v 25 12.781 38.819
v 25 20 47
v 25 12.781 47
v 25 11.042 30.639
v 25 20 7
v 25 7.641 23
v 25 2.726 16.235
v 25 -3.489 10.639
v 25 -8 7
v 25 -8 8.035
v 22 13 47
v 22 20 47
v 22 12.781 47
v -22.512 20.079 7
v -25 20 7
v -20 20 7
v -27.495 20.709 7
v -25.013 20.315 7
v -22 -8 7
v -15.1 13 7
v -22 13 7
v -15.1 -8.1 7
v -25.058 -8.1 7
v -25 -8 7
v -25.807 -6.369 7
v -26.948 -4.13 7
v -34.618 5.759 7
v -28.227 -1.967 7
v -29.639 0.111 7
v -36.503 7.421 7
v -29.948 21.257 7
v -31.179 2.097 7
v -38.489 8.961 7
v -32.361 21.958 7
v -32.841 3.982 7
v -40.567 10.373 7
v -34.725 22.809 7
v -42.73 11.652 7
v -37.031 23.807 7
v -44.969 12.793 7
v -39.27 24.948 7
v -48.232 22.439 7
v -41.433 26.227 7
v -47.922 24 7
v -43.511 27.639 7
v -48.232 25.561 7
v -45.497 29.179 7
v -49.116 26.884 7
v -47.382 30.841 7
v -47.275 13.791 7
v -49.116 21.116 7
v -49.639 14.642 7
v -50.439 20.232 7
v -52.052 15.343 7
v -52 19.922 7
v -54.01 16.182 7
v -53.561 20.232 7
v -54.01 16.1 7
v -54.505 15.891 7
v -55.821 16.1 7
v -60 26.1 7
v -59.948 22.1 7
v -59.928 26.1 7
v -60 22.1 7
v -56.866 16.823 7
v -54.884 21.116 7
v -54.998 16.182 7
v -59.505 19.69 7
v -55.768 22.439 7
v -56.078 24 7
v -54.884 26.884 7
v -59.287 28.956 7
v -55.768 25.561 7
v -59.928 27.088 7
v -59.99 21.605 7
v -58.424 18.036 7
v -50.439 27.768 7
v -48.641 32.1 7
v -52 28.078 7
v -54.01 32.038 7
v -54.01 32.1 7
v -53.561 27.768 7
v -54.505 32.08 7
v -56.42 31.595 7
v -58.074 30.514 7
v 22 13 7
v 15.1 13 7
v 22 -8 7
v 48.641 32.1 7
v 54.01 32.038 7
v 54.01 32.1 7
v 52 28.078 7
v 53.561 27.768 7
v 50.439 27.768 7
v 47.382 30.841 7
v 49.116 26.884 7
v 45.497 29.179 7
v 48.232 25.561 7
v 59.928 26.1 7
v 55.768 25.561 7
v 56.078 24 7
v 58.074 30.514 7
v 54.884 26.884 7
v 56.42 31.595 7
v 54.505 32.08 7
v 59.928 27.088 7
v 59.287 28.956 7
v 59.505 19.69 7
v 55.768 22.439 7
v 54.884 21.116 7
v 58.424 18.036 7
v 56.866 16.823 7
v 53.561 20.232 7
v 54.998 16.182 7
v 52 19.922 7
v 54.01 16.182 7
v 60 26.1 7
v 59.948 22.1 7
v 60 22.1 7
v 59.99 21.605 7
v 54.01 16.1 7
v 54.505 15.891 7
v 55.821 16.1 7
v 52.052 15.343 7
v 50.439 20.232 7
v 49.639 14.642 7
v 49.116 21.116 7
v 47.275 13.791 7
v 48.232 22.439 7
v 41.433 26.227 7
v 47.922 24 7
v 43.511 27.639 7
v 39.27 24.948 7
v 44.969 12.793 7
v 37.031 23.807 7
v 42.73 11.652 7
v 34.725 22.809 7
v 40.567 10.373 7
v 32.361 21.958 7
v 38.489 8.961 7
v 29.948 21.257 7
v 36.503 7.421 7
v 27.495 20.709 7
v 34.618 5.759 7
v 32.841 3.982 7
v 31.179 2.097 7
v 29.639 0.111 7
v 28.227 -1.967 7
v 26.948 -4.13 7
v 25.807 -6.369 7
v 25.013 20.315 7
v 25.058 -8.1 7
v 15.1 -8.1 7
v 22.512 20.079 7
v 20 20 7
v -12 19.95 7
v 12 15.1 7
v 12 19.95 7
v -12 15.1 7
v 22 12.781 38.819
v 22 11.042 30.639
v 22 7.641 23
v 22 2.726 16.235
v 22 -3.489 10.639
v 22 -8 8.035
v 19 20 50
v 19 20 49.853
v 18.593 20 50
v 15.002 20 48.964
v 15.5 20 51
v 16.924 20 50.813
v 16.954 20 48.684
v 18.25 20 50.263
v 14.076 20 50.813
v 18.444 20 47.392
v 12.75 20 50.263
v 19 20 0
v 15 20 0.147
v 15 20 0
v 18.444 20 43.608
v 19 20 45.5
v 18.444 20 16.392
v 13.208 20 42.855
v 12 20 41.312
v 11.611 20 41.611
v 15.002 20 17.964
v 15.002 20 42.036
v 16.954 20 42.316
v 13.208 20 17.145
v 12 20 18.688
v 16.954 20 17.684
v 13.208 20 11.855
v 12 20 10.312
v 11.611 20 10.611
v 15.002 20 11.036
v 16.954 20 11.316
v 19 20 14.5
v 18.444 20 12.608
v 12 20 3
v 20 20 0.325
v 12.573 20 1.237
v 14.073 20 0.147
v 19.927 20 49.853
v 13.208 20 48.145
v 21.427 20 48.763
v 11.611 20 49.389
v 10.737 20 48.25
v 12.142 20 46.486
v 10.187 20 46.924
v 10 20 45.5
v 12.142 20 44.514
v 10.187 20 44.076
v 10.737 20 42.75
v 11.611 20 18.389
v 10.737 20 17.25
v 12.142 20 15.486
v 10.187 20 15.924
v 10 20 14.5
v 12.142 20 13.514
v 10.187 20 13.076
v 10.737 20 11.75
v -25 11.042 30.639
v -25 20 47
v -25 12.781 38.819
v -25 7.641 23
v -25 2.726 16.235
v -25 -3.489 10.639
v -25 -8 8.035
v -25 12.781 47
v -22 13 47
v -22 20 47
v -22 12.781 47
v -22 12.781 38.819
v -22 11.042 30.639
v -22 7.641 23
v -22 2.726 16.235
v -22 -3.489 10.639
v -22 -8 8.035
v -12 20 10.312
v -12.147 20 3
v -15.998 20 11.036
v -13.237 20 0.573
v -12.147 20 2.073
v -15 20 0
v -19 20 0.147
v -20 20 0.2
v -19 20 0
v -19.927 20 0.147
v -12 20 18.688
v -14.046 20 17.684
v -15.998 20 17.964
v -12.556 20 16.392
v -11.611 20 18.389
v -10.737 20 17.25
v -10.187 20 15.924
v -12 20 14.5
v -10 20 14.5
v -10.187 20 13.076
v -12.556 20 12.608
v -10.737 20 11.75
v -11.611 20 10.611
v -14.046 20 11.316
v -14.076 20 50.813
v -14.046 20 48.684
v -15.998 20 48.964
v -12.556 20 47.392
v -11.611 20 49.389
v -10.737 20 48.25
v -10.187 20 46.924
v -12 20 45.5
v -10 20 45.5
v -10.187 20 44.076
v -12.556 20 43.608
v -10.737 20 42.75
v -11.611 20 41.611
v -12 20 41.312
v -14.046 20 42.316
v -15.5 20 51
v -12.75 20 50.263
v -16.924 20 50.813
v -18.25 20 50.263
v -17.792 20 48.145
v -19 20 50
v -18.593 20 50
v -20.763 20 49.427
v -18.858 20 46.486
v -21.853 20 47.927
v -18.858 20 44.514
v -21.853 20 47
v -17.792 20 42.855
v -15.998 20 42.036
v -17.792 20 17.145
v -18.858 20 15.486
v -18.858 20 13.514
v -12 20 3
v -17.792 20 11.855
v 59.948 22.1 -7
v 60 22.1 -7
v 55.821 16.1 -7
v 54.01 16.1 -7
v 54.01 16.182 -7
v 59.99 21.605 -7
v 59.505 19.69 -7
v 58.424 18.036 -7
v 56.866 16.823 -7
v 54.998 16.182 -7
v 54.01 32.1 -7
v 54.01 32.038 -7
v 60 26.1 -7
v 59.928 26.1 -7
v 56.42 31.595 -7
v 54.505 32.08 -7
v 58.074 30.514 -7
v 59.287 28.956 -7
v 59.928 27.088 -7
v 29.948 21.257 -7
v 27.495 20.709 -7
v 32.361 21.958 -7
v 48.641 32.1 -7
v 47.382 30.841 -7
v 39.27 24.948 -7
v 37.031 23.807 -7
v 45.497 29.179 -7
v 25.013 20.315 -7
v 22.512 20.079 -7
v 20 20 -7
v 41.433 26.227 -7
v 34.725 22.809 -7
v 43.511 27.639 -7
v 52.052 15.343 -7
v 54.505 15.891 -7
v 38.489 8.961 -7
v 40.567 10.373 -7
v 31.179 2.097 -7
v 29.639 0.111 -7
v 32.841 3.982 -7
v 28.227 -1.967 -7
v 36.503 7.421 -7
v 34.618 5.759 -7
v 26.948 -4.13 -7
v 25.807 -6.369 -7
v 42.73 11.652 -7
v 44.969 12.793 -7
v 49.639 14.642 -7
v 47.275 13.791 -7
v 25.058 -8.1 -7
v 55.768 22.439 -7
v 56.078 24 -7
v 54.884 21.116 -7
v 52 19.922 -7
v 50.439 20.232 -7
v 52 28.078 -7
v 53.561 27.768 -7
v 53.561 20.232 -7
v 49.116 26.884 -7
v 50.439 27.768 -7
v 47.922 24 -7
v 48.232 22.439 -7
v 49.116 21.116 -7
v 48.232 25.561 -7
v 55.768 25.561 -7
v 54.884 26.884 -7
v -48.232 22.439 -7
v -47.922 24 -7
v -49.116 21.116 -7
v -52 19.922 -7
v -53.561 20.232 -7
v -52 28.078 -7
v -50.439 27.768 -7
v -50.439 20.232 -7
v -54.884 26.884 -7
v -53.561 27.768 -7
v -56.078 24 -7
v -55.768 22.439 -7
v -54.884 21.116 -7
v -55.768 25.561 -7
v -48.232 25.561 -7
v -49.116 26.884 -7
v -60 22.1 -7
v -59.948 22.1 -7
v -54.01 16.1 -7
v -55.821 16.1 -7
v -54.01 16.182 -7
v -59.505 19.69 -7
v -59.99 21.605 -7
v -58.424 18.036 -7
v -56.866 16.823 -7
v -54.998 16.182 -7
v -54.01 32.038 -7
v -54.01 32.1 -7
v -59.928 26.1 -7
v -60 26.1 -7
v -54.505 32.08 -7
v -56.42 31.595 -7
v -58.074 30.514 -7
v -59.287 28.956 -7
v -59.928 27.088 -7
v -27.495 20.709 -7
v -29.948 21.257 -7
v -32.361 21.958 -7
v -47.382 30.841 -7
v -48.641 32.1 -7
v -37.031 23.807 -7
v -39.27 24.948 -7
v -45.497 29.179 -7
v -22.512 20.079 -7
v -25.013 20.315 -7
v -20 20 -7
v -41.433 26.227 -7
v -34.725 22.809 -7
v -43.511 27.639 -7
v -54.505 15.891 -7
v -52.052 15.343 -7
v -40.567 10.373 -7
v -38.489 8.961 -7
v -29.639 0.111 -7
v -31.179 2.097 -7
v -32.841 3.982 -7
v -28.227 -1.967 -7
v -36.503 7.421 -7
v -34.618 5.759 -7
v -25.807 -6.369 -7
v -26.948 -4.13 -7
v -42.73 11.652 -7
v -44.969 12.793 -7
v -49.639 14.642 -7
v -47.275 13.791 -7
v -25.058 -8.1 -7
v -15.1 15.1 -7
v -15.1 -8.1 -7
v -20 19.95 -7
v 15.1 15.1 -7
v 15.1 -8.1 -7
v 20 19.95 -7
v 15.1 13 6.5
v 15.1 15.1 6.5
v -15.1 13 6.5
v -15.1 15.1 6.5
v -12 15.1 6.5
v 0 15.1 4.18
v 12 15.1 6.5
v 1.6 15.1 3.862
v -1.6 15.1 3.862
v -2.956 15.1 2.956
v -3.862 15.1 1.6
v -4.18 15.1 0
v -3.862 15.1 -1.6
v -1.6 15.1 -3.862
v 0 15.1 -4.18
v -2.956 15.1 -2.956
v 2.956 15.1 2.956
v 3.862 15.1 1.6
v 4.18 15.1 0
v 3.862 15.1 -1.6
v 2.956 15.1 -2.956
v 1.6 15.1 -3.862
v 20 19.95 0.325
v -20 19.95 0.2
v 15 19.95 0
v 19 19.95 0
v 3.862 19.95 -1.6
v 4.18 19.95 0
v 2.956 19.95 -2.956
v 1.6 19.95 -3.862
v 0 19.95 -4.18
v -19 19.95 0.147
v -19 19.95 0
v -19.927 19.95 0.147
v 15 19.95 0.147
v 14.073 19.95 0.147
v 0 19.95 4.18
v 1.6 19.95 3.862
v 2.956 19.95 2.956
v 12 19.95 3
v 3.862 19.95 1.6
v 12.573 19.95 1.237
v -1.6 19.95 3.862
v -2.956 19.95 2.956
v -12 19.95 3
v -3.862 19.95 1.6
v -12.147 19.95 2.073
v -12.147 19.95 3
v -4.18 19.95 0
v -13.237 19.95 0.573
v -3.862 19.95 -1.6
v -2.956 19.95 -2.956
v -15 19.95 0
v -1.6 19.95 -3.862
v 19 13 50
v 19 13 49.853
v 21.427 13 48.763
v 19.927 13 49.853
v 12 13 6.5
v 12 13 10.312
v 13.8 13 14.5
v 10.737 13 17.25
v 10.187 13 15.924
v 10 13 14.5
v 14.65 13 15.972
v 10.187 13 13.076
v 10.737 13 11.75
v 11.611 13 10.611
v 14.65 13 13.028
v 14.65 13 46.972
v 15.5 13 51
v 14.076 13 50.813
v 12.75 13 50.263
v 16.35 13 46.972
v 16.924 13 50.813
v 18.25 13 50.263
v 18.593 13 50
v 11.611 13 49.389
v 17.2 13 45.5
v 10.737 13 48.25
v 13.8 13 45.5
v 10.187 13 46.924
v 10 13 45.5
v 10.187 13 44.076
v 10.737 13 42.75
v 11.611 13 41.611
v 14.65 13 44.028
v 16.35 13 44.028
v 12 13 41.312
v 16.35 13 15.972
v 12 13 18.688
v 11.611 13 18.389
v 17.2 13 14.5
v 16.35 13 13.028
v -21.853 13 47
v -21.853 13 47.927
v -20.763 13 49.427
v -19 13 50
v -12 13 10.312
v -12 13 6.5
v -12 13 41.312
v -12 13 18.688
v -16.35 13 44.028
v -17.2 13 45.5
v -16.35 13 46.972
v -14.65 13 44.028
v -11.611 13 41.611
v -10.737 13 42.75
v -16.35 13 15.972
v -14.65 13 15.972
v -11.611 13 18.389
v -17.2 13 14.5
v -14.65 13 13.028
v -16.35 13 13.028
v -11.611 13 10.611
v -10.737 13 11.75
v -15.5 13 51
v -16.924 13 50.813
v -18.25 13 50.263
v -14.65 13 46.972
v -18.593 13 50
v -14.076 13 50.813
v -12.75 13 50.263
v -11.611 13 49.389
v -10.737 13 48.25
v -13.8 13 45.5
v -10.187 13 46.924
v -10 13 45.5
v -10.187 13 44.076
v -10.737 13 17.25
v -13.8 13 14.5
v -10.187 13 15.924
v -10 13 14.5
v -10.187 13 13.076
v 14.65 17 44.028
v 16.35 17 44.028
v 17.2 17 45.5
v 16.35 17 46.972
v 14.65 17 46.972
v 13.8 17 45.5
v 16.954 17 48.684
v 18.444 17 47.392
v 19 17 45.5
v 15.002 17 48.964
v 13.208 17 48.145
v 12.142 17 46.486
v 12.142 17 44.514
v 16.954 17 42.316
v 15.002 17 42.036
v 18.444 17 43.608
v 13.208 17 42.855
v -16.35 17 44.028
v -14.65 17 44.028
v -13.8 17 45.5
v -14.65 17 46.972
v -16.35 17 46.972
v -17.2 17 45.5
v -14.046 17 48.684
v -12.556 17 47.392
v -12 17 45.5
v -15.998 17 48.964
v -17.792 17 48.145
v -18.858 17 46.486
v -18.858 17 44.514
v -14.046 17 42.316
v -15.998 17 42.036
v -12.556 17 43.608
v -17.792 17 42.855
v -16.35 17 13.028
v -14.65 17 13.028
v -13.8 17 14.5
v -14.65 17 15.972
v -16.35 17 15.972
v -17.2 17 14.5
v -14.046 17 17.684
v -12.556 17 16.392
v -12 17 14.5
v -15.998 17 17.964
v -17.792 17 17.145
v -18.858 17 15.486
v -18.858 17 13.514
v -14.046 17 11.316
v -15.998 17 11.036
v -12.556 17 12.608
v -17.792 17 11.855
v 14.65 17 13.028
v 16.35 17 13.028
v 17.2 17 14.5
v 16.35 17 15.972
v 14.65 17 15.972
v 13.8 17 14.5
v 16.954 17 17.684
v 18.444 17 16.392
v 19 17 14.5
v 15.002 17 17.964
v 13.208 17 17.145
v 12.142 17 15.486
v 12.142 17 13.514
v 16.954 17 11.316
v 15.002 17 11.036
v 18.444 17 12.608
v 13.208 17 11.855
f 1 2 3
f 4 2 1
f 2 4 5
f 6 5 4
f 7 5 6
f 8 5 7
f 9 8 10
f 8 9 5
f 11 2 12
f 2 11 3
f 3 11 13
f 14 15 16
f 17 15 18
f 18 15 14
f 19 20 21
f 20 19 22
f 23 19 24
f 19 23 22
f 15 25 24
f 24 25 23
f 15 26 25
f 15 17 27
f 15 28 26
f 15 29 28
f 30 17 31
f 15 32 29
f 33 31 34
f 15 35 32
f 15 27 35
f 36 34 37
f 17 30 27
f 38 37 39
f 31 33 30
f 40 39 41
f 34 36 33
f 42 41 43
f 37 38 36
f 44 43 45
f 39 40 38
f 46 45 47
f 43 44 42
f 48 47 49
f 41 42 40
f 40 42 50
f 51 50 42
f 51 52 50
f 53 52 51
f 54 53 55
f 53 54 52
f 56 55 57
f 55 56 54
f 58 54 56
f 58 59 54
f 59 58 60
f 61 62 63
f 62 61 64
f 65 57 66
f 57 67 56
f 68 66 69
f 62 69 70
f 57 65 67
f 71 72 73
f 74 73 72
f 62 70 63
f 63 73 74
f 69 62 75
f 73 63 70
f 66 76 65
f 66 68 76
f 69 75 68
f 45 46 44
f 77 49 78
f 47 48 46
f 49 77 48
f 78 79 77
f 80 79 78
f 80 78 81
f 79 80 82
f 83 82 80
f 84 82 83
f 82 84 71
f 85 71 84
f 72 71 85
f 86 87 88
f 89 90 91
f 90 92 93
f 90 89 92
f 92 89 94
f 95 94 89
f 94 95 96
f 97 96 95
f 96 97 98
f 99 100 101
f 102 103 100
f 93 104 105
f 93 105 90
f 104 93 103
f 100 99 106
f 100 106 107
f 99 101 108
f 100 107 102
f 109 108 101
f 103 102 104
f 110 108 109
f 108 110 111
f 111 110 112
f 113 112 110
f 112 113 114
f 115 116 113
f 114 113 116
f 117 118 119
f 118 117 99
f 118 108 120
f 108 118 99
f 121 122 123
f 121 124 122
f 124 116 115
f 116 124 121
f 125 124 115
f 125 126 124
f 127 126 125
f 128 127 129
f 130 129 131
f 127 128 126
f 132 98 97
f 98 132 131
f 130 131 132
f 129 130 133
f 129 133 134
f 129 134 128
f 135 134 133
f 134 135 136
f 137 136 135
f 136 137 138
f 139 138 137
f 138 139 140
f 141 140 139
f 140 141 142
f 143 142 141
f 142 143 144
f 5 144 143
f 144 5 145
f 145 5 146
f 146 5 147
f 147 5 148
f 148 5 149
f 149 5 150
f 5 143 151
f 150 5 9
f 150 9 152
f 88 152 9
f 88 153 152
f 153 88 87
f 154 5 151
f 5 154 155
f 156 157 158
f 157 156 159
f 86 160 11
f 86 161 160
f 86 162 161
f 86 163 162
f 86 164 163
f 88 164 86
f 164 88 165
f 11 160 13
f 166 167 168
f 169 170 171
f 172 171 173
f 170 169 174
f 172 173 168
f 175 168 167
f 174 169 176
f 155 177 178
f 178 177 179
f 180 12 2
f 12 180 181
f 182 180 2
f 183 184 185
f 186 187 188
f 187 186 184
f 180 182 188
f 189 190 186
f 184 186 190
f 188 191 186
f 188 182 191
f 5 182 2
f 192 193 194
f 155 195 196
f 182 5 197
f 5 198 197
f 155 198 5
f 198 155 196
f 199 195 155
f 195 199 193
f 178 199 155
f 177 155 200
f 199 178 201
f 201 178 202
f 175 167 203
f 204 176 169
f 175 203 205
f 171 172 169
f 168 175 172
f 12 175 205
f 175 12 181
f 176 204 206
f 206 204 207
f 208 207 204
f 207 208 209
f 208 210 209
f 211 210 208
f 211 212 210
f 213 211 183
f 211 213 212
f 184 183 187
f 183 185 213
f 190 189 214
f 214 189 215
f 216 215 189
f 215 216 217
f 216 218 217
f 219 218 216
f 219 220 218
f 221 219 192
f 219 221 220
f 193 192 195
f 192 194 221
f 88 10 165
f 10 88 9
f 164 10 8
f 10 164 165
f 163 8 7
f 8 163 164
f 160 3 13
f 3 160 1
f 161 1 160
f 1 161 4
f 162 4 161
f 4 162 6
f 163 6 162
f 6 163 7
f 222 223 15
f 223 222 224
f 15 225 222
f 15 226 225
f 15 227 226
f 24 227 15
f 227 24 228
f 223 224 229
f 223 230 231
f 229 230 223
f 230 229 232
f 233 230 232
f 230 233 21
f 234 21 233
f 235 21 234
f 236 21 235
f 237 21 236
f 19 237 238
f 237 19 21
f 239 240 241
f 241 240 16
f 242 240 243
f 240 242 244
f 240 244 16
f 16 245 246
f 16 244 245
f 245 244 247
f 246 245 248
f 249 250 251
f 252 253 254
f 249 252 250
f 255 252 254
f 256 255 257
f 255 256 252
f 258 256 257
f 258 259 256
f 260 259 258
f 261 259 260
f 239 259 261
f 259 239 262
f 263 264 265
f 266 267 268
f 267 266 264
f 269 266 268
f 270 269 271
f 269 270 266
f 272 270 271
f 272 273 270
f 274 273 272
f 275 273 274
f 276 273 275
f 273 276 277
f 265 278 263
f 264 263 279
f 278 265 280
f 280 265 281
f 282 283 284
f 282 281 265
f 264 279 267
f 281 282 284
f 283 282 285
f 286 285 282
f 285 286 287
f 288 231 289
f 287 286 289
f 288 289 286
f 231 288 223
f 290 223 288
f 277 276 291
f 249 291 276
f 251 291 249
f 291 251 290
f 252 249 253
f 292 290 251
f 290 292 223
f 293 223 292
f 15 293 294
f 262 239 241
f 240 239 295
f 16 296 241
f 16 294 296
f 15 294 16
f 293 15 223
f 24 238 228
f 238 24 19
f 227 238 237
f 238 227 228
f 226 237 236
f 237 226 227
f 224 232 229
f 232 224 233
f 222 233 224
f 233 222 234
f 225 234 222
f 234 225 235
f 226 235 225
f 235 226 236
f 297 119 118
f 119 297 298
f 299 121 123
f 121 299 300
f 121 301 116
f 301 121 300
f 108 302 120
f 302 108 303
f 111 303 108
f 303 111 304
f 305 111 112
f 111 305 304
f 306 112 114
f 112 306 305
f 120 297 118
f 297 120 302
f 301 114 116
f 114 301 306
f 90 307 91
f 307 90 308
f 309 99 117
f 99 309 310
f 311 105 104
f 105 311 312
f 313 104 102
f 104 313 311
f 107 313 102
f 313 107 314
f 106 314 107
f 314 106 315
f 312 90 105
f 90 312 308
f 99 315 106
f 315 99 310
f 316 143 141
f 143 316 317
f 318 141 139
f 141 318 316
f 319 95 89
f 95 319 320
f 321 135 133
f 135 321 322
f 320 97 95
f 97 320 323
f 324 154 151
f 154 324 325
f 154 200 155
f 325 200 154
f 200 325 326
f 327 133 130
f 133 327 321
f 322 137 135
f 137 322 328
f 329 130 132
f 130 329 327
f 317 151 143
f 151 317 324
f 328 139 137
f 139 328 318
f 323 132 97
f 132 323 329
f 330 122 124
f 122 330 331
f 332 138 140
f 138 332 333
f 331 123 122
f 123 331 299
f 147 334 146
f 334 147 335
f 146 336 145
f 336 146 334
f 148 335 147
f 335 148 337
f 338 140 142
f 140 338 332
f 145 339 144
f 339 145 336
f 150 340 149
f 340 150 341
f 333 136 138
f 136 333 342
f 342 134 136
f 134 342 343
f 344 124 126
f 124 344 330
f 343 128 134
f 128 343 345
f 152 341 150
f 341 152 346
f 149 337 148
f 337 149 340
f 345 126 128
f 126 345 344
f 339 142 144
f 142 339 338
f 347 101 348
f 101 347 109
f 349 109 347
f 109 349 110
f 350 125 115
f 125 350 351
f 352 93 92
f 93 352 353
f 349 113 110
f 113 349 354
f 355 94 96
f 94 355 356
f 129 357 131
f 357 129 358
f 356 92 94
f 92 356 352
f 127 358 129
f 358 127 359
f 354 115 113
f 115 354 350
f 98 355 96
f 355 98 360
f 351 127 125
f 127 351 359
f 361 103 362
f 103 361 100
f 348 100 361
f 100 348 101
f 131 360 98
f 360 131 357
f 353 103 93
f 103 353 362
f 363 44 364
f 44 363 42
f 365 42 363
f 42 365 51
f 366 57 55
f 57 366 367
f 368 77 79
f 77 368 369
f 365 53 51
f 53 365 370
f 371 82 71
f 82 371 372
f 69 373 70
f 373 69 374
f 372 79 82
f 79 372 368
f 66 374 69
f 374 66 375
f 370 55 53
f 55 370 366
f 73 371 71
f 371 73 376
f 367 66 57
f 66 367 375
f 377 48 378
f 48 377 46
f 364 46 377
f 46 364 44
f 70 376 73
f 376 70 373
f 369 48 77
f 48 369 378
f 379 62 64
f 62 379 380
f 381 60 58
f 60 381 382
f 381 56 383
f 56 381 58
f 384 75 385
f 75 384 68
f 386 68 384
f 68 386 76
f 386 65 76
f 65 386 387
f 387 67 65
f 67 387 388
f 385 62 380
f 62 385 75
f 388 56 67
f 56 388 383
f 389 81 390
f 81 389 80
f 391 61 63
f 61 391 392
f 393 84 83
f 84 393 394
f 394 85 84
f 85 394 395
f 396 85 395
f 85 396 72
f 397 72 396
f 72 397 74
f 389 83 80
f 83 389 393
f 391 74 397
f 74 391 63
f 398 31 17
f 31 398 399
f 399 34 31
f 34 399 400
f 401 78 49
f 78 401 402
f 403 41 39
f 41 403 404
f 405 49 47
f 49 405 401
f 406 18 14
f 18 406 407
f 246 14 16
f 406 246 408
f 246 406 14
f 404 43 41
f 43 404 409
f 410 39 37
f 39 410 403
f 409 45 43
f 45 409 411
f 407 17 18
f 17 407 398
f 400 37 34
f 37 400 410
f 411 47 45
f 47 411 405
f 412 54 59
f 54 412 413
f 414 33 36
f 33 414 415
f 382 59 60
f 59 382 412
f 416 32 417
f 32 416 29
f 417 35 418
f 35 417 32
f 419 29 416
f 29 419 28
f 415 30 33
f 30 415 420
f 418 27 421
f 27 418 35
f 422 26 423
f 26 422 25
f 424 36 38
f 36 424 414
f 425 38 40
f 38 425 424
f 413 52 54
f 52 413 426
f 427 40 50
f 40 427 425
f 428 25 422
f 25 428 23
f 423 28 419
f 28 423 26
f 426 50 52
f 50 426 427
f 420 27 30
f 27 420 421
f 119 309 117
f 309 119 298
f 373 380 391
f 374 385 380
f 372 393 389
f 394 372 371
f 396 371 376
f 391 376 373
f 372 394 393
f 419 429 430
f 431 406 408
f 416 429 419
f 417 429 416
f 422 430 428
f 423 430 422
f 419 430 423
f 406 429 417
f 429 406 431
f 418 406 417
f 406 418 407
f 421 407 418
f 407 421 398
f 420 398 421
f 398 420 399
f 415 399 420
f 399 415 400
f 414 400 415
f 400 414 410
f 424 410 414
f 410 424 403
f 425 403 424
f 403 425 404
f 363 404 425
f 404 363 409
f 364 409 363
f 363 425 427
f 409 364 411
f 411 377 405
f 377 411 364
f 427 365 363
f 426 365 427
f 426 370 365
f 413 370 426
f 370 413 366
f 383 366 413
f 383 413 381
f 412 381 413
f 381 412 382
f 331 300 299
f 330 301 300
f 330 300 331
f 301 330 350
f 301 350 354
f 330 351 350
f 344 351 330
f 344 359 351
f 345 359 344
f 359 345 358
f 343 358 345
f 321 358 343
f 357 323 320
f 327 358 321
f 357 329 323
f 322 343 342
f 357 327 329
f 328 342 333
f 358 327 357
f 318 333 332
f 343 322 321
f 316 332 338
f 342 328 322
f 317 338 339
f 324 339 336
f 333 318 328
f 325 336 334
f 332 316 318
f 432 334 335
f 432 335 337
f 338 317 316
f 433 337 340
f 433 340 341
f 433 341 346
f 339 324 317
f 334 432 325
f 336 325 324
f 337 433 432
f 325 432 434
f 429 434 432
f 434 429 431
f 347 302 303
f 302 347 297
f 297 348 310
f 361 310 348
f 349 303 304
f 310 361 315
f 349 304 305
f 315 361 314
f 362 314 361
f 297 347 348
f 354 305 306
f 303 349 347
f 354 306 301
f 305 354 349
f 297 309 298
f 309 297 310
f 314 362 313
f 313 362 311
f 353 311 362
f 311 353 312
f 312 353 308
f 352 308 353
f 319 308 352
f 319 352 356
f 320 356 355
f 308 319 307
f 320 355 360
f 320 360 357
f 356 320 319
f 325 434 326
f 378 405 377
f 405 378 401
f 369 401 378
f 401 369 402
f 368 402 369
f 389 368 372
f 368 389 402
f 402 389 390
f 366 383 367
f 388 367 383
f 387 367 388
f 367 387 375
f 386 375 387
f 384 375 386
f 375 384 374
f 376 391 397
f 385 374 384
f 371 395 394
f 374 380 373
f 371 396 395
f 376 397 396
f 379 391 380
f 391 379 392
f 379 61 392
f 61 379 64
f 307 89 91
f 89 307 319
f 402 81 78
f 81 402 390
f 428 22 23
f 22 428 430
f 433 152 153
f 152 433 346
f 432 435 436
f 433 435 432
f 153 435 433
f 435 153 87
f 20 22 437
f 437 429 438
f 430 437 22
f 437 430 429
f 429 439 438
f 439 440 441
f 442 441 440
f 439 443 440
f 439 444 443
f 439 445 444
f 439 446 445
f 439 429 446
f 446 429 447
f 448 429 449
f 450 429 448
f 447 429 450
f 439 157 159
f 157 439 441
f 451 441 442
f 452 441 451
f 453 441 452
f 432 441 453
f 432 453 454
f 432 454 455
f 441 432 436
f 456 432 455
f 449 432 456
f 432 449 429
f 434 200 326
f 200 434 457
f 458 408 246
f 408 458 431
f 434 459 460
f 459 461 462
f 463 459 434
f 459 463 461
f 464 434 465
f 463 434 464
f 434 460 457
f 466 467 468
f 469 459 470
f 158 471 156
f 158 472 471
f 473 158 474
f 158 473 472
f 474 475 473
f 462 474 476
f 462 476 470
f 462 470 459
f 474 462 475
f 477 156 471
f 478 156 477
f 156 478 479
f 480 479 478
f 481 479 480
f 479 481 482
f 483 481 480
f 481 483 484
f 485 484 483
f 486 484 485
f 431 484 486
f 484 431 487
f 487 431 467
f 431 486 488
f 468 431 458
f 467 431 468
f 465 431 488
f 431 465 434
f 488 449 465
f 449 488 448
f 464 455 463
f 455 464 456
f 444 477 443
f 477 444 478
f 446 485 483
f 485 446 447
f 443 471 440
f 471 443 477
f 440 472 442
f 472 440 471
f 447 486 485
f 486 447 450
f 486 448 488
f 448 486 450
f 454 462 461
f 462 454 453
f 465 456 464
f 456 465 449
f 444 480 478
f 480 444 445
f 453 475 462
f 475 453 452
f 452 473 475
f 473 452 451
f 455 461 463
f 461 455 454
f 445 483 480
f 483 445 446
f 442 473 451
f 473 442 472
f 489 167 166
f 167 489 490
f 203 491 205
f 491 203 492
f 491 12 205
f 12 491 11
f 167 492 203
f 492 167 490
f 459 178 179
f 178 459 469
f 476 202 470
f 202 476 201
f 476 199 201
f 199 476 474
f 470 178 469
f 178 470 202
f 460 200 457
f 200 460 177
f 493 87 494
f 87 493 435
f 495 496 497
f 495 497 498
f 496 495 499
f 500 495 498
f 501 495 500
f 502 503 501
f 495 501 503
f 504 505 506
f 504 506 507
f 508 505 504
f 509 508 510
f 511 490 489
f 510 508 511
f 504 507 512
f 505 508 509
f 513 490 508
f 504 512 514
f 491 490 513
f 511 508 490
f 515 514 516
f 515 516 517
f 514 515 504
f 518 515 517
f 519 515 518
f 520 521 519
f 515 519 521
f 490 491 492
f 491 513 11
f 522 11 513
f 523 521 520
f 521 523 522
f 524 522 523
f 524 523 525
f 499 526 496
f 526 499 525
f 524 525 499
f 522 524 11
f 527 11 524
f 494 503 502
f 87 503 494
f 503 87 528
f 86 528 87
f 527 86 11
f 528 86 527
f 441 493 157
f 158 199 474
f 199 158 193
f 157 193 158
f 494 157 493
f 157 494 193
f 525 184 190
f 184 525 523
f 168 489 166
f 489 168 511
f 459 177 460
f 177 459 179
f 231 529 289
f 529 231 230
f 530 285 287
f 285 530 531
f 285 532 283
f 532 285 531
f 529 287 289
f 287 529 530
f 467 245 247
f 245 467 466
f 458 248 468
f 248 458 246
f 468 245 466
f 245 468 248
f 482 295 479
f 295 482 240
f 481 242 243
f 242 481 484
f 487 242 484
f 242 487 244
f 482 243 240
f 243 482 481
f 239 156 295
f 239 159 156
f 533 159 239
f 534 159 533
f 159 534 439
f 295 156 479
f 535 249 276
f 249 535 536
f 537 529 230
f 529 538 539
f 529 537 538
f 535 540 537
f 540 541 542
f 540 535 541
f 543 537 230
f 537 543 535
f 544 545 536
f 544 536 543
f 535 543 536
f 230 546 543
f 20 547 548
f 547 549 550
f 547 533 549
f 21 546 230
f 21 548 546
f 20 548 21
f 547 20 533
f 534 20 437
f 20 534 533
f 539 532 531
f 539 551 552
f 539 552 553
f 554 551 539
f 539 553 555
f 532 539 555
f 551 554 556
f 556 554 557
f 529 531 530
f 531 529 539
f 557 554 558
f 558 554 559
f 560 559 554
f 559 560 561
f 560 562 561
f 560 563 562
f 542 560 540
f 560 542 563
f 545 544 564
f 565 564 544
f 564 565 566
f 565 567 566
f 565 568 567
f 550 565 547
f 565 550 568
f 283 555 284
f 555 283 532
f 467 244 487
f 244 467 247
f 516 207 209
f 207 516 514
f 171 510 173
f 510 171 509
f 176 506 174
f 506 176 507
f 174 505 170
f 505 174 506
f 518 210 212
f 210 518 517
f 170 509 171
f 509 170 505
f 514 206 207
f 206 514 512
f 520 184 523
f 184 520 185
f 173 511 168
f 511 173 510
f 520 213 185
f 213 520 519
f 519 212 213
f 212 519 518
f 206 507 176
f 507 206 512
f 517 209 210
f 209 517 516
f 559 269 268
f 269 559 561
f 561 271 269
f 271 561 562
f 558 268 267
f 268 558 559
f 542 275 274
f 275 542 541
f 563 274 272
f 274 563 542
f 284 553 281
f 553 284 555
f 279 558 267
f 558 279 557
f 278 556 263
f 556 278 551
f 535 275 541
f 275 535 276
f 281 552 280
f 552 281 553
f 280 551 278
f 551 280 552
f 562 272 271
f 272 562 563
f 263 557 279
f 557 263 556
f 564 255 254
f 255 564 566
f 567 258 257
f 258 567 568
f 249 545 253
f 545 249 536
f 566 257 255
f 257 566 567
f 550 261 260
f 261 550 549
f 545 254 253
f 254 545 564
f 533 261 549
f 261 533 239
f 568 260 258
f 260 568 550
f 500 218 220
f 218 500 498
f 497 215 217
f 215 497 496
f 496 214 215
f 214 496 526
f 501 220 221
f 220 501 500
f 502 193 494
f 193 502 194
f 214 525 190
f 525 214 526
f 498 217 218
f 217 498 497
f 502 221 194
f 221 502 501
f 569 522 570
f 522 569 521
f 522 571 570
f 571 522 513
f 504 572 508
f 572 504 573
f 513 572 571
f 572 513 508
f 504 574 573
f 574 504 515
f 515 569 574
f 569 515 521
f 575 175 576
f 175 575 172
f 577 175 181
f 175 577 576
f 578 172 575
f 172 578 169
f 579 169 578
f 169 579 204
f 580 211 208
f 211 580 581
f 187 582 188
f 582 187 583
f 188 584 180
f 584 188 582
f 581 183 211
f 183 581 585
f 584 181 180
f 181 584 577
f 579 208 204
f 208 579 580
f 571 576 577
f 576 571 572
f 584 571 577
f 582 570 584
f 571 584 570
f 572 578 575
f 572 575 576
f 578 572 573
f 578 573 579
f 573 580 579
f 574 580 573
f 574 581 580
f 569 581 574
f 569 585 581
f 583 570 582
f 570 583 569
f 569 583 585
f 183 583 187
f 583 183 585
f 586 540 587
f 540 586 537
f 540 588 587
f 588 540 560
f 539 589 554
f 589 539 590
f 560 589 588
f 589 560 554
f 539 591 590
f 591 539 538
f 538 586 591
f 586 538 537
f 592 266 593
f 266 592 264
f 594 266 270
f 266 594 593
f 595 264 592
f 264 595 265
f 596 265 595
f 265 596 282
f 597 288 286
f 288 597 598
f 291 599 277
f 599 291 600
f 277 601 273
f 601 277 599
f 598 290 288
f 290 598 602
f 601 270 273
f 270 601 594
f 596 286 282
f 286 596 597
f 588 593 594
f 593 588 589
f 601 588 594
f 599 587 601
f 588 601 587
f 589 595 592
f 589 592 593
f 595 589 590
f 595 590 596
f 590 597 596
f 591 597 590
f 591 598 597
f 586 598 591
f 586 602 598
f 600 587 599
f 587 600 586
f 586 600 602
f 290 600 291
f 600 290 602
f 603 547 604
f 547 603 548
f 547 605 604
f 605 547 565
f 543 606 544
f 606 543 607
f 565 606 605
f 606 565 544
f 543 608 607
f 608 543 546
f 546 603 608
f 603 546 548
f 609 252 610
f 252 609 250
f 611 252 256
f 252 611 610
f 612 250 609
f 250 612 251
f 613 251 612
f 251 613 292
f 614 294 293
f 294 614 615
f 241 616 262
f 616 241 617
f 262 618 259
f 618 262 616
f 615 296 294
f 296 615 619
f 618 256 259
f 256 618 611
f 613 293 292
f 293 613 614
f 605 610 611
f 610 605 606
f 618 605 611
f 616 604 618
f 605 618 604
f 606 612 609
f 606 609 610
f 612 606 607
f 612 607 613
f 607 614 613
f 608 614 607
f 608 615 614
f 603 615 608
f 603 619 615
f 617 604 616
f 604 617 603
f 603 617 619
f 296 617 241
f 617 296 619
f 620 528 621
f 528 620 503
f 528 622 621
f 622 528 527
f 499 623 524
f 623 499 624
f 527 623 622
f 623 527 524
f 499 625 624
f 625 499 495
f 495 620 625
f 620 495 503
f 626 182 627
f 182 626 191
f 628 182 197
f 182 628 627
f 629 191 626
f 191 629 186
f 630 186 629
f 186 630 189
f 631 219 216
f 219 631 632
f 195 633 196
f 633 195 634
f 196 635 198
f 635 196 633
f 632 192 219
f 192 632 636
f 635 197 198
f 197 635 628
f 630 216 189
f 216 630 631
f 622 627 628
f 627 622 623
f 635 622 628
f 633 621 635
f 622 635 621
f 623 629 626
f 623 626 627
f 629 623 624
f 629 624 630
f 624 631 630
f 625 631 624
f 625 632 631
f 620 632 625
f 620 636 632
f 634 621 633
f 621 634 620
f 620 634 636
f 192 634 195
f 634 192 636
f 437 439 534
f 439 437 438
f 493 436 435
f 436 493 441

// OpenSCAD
// file: inc/functions.scad
// PRUSA iteration3
// Functions used in many files
// GNU GPL v3
// Josef Průša <josefprusa@me.com>
// Václav 'ax' Hůla <axtheb@gmail.com>
// Vlnofka <>
// http://www.reprap.org/wiki/Prusa_Mendel
// http://github.com/prusajr/PrusaMendel

module roundcorner(diameter){
	difference(){
		cube(size = [diameter,diameter,99], center = false);
		translate(v = [diameter, diameter, 0]) cylinder(h = 100, r=diameter, center=true);
	}
}
module nut(d,h,horizontal=true){
    cornerdiameter =  (d / 2) / cos (180 / 6);
    cylinder(h = h, r = cornerdiameter, $fn = 6);
    if(horizontal){
        for(i = [1:6]){
            rotate([0,0,60*i]) translate([-cornerdiameter-0.2,0,0]) rotate([0,0,-45]) cube([2,2,h]);
        }
    }
}

// Based on nophead research
module polyhole(d, h, center=false) {
    n = max(round(2 * d),3);
    rotate([0,0,180])
        cylinder(h = h, r = (d / 2) / cos (180 / n), $fn = n);
}

// make it interchangeable between this and cylinder
module cylinder_poly(r, h, center=false){
    polyhole(d=r*2, h=h, center=center);
}

module fillet(radius, height=100, $fn=0) {
    //this creates acutal fillet
    translate([-radius, -radius, -height/2-0.01])
        difference() {
            cube([radius*2, radius*2, height+0.02]);
            cylinder(r=radius, h=height+0.02, $fn=$fn);
        }
}

module cube_fillet(size, radius=-1, vertical=[3,3,3,3], top=[0,0,0,0], bottom=[0,0,0,0], center=false, $fn=0){
    //
    if (center) {
        cube_fillet_inside(size, radius, vertical, top, bottom, $fn);
    } else {
        translate([size[0]/2, size[1]/2, size[2]/2])
            cube_fillet_inside(size, radius, vertical, top, bottom, $fn);
    }
}

module cube_negative_fillet(size, radius=-1, vertical=[3,3,3,3], top=[0,0,0,0], bottom=[0,0,0,0], $fn=0){

    j=[1,0,1,0];

    for (i=[0:3]) {
        if (radius > -1) {
            rotate([0, 0, 90*i]) translate([size[1-j[i]]/2, size[j[i]]/2, 0]) fillet(radius, size[2], $fn=$fn);
        } else {
            rotate([0, 0, 90*i]) translate([size[1-j[i]]/2, size[j[i]]/2, 0]) fillet(vertical[i], size[2], $fn=$fn);
        }
        rotate([90*i, -90, 0]) translate([size[2]/2, size[j[i]]/2, 0 ]) fillet(top[i], size[1-j[i]], $fn=$fn);
        rotate([90*(4-i), 90, 0]) translate([size[2]/2, size[j[i]]/2, 0]) fillet(bottom[i], size[1-j[i]], $fn=$fn);

    }
}

module cube_fillet_inside(size, radius=-1, vertical=[3,3,3,3], top=[0,0,0,0], bottom=[0,0,0,0], $fn=0){
    //makes CENTERED cube with round corners
    // if you give it radius, it will fillet vertical corners.
    //othervise use vertical, top, bottom arrays
    //when viewed from top, it starts in upper right corner (+x,+y quadrant) , goes counterclockwise
    //top/bottom fillet starts in direction of Y axis and goes CCW too


    if (radius == 0) {
        cube(size, center=true);
    } else {
        difference() {
            cube(size, center=true);
            cube_negative_fillet(size, radius, vertical, top, bottom, $fn);
        }
    }
}


module nema17(places=[1,1,1,1], size=15.5, h=10, holes=false, shadow=false, $fn=24){
    for (i=[0:3]) {
        if (places[i] == 1) {
            rotate([0, 0, 90*i]) translate([size, size, 0]) {
                if (holes) {
                    #rotate([0, 0, -90*i])  translate([0,0,-10]) screw(r=1.7, slant=false, head_drop=13, $fn=$fn, h=h+12);
                } else {
                    rotate([0, 0, -90*i]) cylinder(h=h, r=5.5, $fn=$fn);
                }
            }
        }
    }
    if (shadow != false) {
        %translate ([0, 0, shadow+21+3]) cube([42,42,42], center = true);
    //flange
        %translate ([0, 0, shadow+21+3-21-1]) cylinder(r=11,h=2, center = true, $fn=20);
    //shaft
        %translate ([0, 0, shadow+21+3-21-7]) cylinder(r=2.5,h=14, center = true);
    }
}

module screw(h=20, r=2, r_head=3.5, head_drop=0, slant=true, poly=false, $fn=0){
    //makes screw with head
    //for substraction as screw hole
    if (poly) {
        cylinder_poly(h=h, r=r, $fn=$fn);
    } else {
        cylinder(h=h, r=r, $fn=$fn);
    }
    if (slant) {
        translate([0, 0, head_drop-0.01]) cylinder(h=r_head, r2=0, r1=r_head, $fn=$fn);
    }

    if (head_drop > 0) {
        translate([0, 0, -0.01]) cylinder(h=head_drop+0.01, r=r_head, $fn=$fn);
    }
}
module screw_cylinder(r_head=5.25,r=3.25,head_drop=6.2,slant=false){
	screw(r_head=r_head,head_drop=head_drop,r=r, slant=slant);

}

//screw_cylinder();
//cube_fillet([10,20,30], vertical=[3,2,0,0], top=[3,2,0,5], bottom=[3,2,0,5]);
//cube_fillet([10,20,30], radius=2, top=[7,2,7,2]);
// file: inc/metric.scad
// PRUSA iteration3
// Default metric sizes
// GNU GPL v3
// Josef Průša <josefprusa@me.com>
// http://www.reprap.org/wiki/Prusa_Mendel
// http://github.com/prusajr/PrusaMendel

// DONT CHANGE THIS FILE! ALTER VALUES IN CONFIGURATION.SCAD INSTEAD

// RODS

threaded_rod_diameter = 8.7;
threaded_rod_diameter_horizontal = 8.7;
smooth_bar_diameter = 8;
smooth_bar_diameter_horizontal = 8.8;

// Nuts and bolts

m8_diameter = 9;
m8_nut_diameter = 14.1;

m4_diameter = 4.5;
m4_nut_diameter = 9;

m3_diameter = 3.6;
m3_nut_diameter = 5.3;
m3_nut_diameter_horizontal = 6.1;

// Bushing holder

bushing_core_diameter = smooth_bar_diameter;
bushing_material_thickness = 1;

// Motors

motor_shaft = 5.5;
// file: bushing.scad
// PRUSA iteration3
// Bushing/bearing housings
// GNU GPL v3
// Josef Průša <josefprusa@me.com>
// Václav 'ax' Hůla <axtheb@gmail.com>
// http://www.reprap.org/wiki/Prusa_Mendel
// http://github.com/prusajr/PrusaMendel

include <configuration.scad>

/**
 * @id bushing
 * @name Bushing
 * @category Printed
 * @id bushing
 */

// Linear bearing options
lm8uu_diameter=(bearing_type==1) ? 16 : 15;
lm8uu_length=(bearing_type==1) ? 25 : 24;
lm8uu_radius = lm8uu_diameter / 2;
block_height = 2*lm8uu_length+17;

// basic building blocks, housings for 1 bushing/bearing
// at [0,0] there is center of the smooth rod, pointing in Z

module linear_bushing_square(h=11) {
    translate([0,0,h/2]) {
        difference(){
            union(){
                translate([-10.5/2,0,0]) cube([10.5,13.8,h], center = true);
                cube([13.8,13.8,h], center = true);
            }
            cube([9,9,h+0.02], center = true);
        }
    }
}

module linear_bushing_round(h=11) {
    difference(){
        union(){
            translate([-10.5/2,0,h/2]) cube([10.5,13.8,h], center = true);
            cylinder(r=7.5, h=h);
        }
        translate([0,0,-0.01])  cylinder(r=5.1, h=h+0.02);
    }
}

module linear_bushing_bronze(h=11) {
    difference(){
        union(){
            translate([-10.5/2,0,h/2]) cube([10.5,13.8,h], center = true);
            cylinder(r=10.7, h=h);
        }
        translate([0,0,-0.01])  cylinder(r=8.1, h=h+0.02);
    }
}

// select right bushing and cut it at angle, so it can be printed upside down
module linear_bushing_long(h=30){
    intersection(){
        if (bushing_type == 0) {
            linear_bushing_square(h);
        }
        if (bushing_type == 1) {
            linear_bushing_round(h);
        }
        if (bushing_type == 2) {
            linear_bushing_bronze(h);
        }
        if (bushing_type == 2) {
            translate([0, 0, 0]) rotate([0,-55,0]) cube([30, 40, 80], center=true);
        } else {
            translate([0, 0, -4]) rotate([0,-45,0]) cube([30, 40, 80], center=true);
        }
    }
}

module linear_bushing(h=65){
    translate([-9.5,0,h/2]) cube([2,13.8,h], center=true);
    linear_bushing_long(h);
    if (h>30) {
        translate([0,0,h]) mirror([0,0,1]) linear_bushing_long(30);
    }
}

//this is for Z axis
module bushing_negative(h=lm8uu_length+4){
    if (bearing_choice == 1) {
        if (bushing_type == 0) {
            translate([0,0,h/2]) cube([9,9,h+0.02], center = true);
        }
        if (bushing_type == 1) {
            translate([0,0,-0.01])  cylinder(r=5.1, h=h+0.02);
        }
        if (bushing_type == 2) {
            translate([0,0,-0.01])  cylinder(r=8.1, h=h+0.02);
        }
    } else {
        translate([0,0,-0.01])  cylinder(r=lm8uu_radius+0.4, h=h+0.02);
    }

}

// this should be more parametric
module firm_foot(){
    difference(){
        union() {
            translate([3-0.25,16,0]) cube_fillet([8.5,18,20], top=[11,0,0,0], center=true);
        }
        #translate([7,14,0]) rotate([0,-90,0]) screw();
    }
}

module spring_foot(){

    difference(){
        union() {
            translate([0.5,23.5,0]) cube_fillet([3,14,20], top=[11,0,0,0], center=true);
            translate([5,17,0]) rotate([0,0,-15]) cube_fillet([12,3,20], center=true);
            translate([5,13,0]) rotate([0,0,25]) cube_fillet([13,3,20], center=true);
            translate([0,9,0]) cube_fillet([3,6,20], vertical=[0,2,0,0], center=true);
        }
        translate([2,24,0]) rotate([0,-90,0]) screw();
    }
}

module y_bearing(float=false){
    if (bearing_choice == 2) {
        linear_bearing(lm8uu_length+4);
    } else {
        linear_bushing_long(20);
    }
    translate([-9,0,10]) {
        if (float) {
            spring_foot();
            mirror([0,1,0]) spring_foot();
        } else {
            firm_foot();
            mirror([0,1,0]) firm_foot();
        }
    }
}


module linear_bearing(h=0, fillet=false){
    linear_holder_base((h > lm8uu_length+4)? h : lm8uu_length+4, fillet);
    translate([-(3)/2-lm8uu_radius+2,0,1]) cube([3,18,2], center = true);
    translate([-(3)/2-lm8uu_radius+2,0,((h > lm8uu_length+4)? h : lm8uu_length+4)-1]) cube([3,18,2], center = true);
    if ( (h-4)/2 > lm8uu_length){
        translate([-(3)/2-lm8uu_radius+2,0,h/2]) cube([3,18, (h-4)-2*lm8uu_length], center = true);
    }
}

module linear_holder_base(length, fillet=false){

    difference(){
        union(){
            //main block
            translate([-10.5/2,0,length/2]) cube([10.5,lm8uu_diameter+5,length], center = true);
            translate([0,0,0]) cylinder(h = length, r=lm8uu_radius+2.5, $fn=60);
        }
        //main axis
        translate([0,0,-2]) cylinder(h = length+4, r=(lm8uu_diameter+0.4)/2, $fn=50);
        // not needed for zip tie
        //main cut
        translate([10,0,length/2]) cube([20,14,length+4], center = true);
        //smooth entry cut
        translate([12,0,length/2]) rotate([0,0,45]) cube([20,20,length+4], center = true);
        if (fillet) {
            translate([0,0,length/2 ]) cube_negative_fillet([21,lm8uu_diameter+5,length], vertical=[0,3,3,0]);
        }
    }
}


%cylinder(r=4, h=90);
y_bearing();
translate([0,52,0]) y_bearing();
if (bearing_choice == 2) {
    translate([-22, 23, 0]) y_bearing();
} else {
    translate ([-26,23,0]) mirror([1,0,0]) y_bearing(true);
}
// file: bearing-guide.scad
// This one is AWESOME design by Greg Frost!!

// PRUSA Mendel  
// Bearing guide
// GNU GPL v3
// Josef Průša
// josefprusa@me.com
// prusadjs.cz
// http://www.reprap.org/wiki/Prusa_Mendel
// http://github.com/prusajr/PrusaMendel


/**
 * Helps to hold belt aligned on the bearing.
 * @id bearing-guide
 * @name Bearing guide
 * @category Printed
 */

single_layer_width=0.6;
bearing_inner=22.3;
thickness=1.7;
height=7+thickness;
wall_ascent=3;
wall_descent=0.5;

module inner()
{
	difference()
	{
		cylinder(r=5,h=2);
		color("red")translate([0,0,-1])
		cylinder(r=4,h=height+2);
	}

	difference()
	{
		color("red")cylinder(r=15,h=thickness);
		translate([0,0,-1])
		cylinder(r=5,h=thickness+2);
	}
}

module outer()
{
	difference()
	{
		cylinder(r=bearing_inner/2+2*single_layer_width+0.3,h=height);
		translate([0,0,-1])
		cylinder(r=bearing_inner/2+single_layer_width+0.3,h=height+2);
	}

	difference()
	{
		cylinder(r=bearing_inner/2+wall_ascent,h=thickness);
		translate([0,0,-1])
		cylinder(r=bearing_inner/2-wall_descent,h=thickness+2);
	}
}

inner();

//translate([29,0,0])
//outer();
// file: y-belt-holder.scad
// PRUSA iteration3
// Y belt holder
// GNU GPL v3
// Josef Průša <josefprusa@me.com>
// Václav 'ax' Hůla <axtheb@gmail.com>
// http://www.reprap.org/wiki/Prusa_Mendel
// http://github.com/prusajr/PrusaMendel

include <configuration.scad>
//y_belt_holder();
rotate([0,90,0])beltholder_nuts();


module y_belt_holder(){
translate([0, -10, 0])rotate([0,0,-90]){
	difference(){
    	union(){
    		translate([-24.5+9.5, 0, 17.5]) cube_fillet([10, 14, 35], center = true, vertical=[3,3,0,0], fn=8 );
    
    		translate([-10, 1.5-9, 17.5]) cube([40, 5, 35], center = true);

    		difference(){        	
            translate([-4.0, 0, 17.5]) cube_fillet([8.5, 14, 35], center = true, vertical = [2,2,0,2], fn=8);        
        		translate([-4.5, 0, 17.5]) cube([10, 10, 10], center = true);       
        
        		intersection() {
            	for (i = [0 : 35/belt_tooth_distance])
            	{
                	translate([-9.0, 0, 1+i*belt_tooth_distance]) cube([3, 10, belt_tooth_distance*belt_tooth_ratio], center = true);
            	}
            	translate([0, 0, 35/2]) cube([20, 10, 35], center = true);
        		}

    		}
		}

		translate([-25, -4, 8]) rotate([90, 0, 0]) screw();
		translate([-25, -4, 28]) rotate([90, 0, 0]) screw();
		translate([5, -4, 8]) rotate([90, 0, 0]) screw();
		translate([5, -4, 28]) rotate([90, 0, 0]) screw();

	}
}
}

module beltholder_nuts(){
	translate([-14, 0, 17.5])rotate([0,0,-90]) {
		difference(){
			cube_fillet([40, 4, 35], center = true,vertical = [0,0,2,2],top=[0,0,2,0],bottom=[0,0,2,0], fn=8);
			translate([-15, 10, -10]) rotate([90, 0, 0]) cylinder(r=m3_diameter/2,h=20);
			translate([-15, 0, -10]) rotate([90,0,0])nut(d=m3_nut_diameter_horizontal,h=2.5);

			translate([-15, 10, 10]) rotate([90, 0, 0]) cylinder(r=m3_diameter/2,h=20);
			translate([-15, 0, 10])rotate([90,0,0])nut(d=m3_nut_diameter_horizontal,h=2.5);

			translate([15, 10, -10]) rotate([90, 0, 0]) cylinder(r=m3_diameter/2,h=20);
			translate([15, 0, -10])rotate([90,0,0])nut(d=m3_nut_diameter_horizontal,h=2.5);

			translate([15, 10, 10]) rotate([90, 0, 0]) cylinder(r=m3_diameter/2,h=20);
			translate([15, 0, 10])rotate([90,0,0])nut(d=m3_nut_diameter_horizontal,h=2.5);

			translate([0, 5, 0])rotate([90,0,0])cylinder(r=10,h=10);
			
		}
		
	}

}
// file: configuration.scad
// PRUSA iteration3
// Configuration file
// GNU GPL v3
// Josef Průša <josefprusa@me.com>
// Václav 'ax' Hůla <axtheb@gmail.com>
// http://www.reprap.org/wiki/Prusa_Mendel
// http://github.com/prusajr/PrusaMendel

// PLEASE SELECT ONE OF THE CONFIGURATIONS BELOW
// BY UN-COMMENTING IT

// Uncomment for metric settings
// METRIC METRIC METRIC METRIC METRIC METRIC METRIC METRIC 

include <inc/metric.scad>;

// Custom settings here, tailor to your supplies and print settings

// Select your belt type ******************************************************

//T2.5
//belt_tooth_distance = 2.5;
//belt_tooth_ratio = 0.5;

//T5 (strongly discouraged)
belt_tooth_distance = 5;
belt_tooth_ratio = 0.75;

//HTD3
//belt_tooth_distance = 3;
//belt_tooth_ratio = 0.75;

//MXL
//belt_tooth_distance = 2.032;
//belt_tooth_ratio = 0.64;

// Choose bearing/bushing configuration ***************************************

//Choose from:

// 0 = Z as lm[e]8uu, X and Y bushings
// 1 = all bushings
// 2 = all bearings [default. Do not change unless you really know what you are doing]
// DO NOT OFFER 0 or 1 VARIANTS FOR SALE. We really mean that. In the long run it hurts everyone.

bearing_choice = 2;

// Bushing version
// 0 = square igus housings. By igus we mean JFM-0810-10 or GFM-0810-10
// 1 = round igus (works better if printed precisely)
// 2 = bronze self-aligning bushings
bushing_type = 0;

//Bearing version
// 0 = default lm8uu
// 1 = lme8uu
bearing_type = 0;

// Select idler bearing size **************************************************

// 0 = 608 [standard skate bearings]
// 1 = 624 [roughly same diameter as pulley, makes belt parallel so its prettier]

idler_bearing = 0;

// Thickness of the XZ plate board
board_thickness = 12;

//Layer height * width over thickness. Used for idler sleeve
single_wall_width = 0.3*2.2;

// END of custom settings


// You are not supposed to change this
board_to_xz_distance = 26;
xaxis_rod_distance = 45;
carriage_l = 74;
carriage_hole_to_side = 5;
carriage_hole_height = 4;

//calculated from settings

idler_size = (idler_bearing == 0) ? 22 : 13;

//use 4.5 for 608, 2.5 for 624
idler_size_inner_r = (idler_bearing == 0) ? 4.5 : 2.5;

idler_width = (idler_bearing == 0) ? 9 : 5;

// CHANGE ONLY THE STUFF YOU KNOW
// IT WILL REPLACE DEFAULT SETTING

// RODS

// threaded_rod_diameter = 0;
// threaded_rod_diameter_horizontal = 0;
// smooth_bar_diameter = 0;
// smooth_bar_diameter_horizontal = 0;

// Nuts and bolts

// m8_diameter = 0;
// m8_nut_diameter = 0;

// m4_diameter = 0;
// m4_nut_diameter = 0;

// m3_diameter = 0;
// m3_nut_diameter = 0;

// Bushing holder

// bushing_core_diameter = smooth_bar_diameter;
// bushing_material_thickness = 0;

///counted stuff
m3_nut_diameter_bigger = ((m3_nut_diameter  / 2) / cos (180 / 6))*2;

// functions
include <inc/functions.scad>


// These constants define the geometry of the complete-printer.scad

//x_smooth_rod_length=325;
//y_smooth_rod_length=405;
//z_smooth_rod_length=235;
bed_x_size=225;
bed_y_size=225;

x_smooth_rod_length=450+board_thickness*2+10; // 492 for 16mm thickness; 484 for 12mm thickness
y_smooth_rod_length=470;
z_smooth_rod_length=405;  
bed_x_size=225;
bed_y_size=225;
// main file
include <configuration.scad>
use <y-belt-holder.scad>
use <bearing-guide.scad>
use <bushing.scad>

aluminiu_profile=30.2;
verticalHole=8.7;

y_motor_mount();
//y_axis();
//translate([10,23,-90])color("red",0.3)cube([2,5,90]);
//translate([0,36,0])color("red",0.3)cube([200,2,200],center=true);
//translate([-52,24,-70])rotate([0,0,-90]){
//	y_bearing();
//	color("gray",0.3)cylinder(r=4, h=90);
//}

//translate([52,24,-70])rotate([0,0,-90]){
//	y_bearing();
//	color("gray",0.3)cylinder(r=4, h=90);
//}
//translate([12,25,-80])rotate([0,0,-90])y_belt_holder();

//color("blue",0.3)translate([0,30,0])rotate([90,0,0]){
//	inner();
//	translate([0,0,10])rotate([180,0,0])outer();
//}


//y_motor_mount();
module y_axis(){
	difference(){
		translate([0,12,0])cube([120,aluminiu_profile+10,14], center=true);
		cube([aluminiu_profile,aluminiu_profile,25], center=true);
		smoothbar_support();
		mirror() smoothbar_support();
		translate([0,27,0])cube([40,14.1,25],center=true);
		translate([0,40,0])rotate(a=[90,0,0])polyhole(d=8.2,h=130);
	}
}

module smoothbar_support(){
	translate([20,60,0])cylinder(r=40,h=15, center=true,$fn=100);
		translate([62,-23.4,0])cylinder(r=40,h=15, center=true,$fn=100);
		translate([60.01,16.1,-11])rotate([0,0,-270])roundcorner(6);
		translate([60.01,32.1,-11])rotate([0,0,180])roundcorner(6);
		translate([52,24,-20])polyhole(smooth_bar_diameter,40);
		translate([-52,24,-20])polyhole(smooth_bar_diameter,40);
}
module motor_fix(){
	difference(){
		translate([23.5,6,27])cube([3,28,40],center=true);
		translate([20.1,-27,43])rotate([0,90,0])cylinder(r=40,h=5);
				
	}
}
module y_motor_mount(){
	difference(){
		union(){
			motor_fix();
			mirror() motor_fix();
			y_axis();	
			translate([0,20,30])rotate([90,0,0]){
				difference(){
					union(){
						translate([12,-30,0])cube_fillet([10,50,7]);
						translate([-22,-30,0])cube_fillet([10,50,7]);
						nema17(places=[1,1,1,1], h=7);
					}
					nema17(places=[1,1,1,1], holes=true, h=7, shadow=5);
			
				}
			}
		}
		translate([0,0,-6])cube([aluminiu_profile,aluminiu_profile,25], center=true);
	}
}
